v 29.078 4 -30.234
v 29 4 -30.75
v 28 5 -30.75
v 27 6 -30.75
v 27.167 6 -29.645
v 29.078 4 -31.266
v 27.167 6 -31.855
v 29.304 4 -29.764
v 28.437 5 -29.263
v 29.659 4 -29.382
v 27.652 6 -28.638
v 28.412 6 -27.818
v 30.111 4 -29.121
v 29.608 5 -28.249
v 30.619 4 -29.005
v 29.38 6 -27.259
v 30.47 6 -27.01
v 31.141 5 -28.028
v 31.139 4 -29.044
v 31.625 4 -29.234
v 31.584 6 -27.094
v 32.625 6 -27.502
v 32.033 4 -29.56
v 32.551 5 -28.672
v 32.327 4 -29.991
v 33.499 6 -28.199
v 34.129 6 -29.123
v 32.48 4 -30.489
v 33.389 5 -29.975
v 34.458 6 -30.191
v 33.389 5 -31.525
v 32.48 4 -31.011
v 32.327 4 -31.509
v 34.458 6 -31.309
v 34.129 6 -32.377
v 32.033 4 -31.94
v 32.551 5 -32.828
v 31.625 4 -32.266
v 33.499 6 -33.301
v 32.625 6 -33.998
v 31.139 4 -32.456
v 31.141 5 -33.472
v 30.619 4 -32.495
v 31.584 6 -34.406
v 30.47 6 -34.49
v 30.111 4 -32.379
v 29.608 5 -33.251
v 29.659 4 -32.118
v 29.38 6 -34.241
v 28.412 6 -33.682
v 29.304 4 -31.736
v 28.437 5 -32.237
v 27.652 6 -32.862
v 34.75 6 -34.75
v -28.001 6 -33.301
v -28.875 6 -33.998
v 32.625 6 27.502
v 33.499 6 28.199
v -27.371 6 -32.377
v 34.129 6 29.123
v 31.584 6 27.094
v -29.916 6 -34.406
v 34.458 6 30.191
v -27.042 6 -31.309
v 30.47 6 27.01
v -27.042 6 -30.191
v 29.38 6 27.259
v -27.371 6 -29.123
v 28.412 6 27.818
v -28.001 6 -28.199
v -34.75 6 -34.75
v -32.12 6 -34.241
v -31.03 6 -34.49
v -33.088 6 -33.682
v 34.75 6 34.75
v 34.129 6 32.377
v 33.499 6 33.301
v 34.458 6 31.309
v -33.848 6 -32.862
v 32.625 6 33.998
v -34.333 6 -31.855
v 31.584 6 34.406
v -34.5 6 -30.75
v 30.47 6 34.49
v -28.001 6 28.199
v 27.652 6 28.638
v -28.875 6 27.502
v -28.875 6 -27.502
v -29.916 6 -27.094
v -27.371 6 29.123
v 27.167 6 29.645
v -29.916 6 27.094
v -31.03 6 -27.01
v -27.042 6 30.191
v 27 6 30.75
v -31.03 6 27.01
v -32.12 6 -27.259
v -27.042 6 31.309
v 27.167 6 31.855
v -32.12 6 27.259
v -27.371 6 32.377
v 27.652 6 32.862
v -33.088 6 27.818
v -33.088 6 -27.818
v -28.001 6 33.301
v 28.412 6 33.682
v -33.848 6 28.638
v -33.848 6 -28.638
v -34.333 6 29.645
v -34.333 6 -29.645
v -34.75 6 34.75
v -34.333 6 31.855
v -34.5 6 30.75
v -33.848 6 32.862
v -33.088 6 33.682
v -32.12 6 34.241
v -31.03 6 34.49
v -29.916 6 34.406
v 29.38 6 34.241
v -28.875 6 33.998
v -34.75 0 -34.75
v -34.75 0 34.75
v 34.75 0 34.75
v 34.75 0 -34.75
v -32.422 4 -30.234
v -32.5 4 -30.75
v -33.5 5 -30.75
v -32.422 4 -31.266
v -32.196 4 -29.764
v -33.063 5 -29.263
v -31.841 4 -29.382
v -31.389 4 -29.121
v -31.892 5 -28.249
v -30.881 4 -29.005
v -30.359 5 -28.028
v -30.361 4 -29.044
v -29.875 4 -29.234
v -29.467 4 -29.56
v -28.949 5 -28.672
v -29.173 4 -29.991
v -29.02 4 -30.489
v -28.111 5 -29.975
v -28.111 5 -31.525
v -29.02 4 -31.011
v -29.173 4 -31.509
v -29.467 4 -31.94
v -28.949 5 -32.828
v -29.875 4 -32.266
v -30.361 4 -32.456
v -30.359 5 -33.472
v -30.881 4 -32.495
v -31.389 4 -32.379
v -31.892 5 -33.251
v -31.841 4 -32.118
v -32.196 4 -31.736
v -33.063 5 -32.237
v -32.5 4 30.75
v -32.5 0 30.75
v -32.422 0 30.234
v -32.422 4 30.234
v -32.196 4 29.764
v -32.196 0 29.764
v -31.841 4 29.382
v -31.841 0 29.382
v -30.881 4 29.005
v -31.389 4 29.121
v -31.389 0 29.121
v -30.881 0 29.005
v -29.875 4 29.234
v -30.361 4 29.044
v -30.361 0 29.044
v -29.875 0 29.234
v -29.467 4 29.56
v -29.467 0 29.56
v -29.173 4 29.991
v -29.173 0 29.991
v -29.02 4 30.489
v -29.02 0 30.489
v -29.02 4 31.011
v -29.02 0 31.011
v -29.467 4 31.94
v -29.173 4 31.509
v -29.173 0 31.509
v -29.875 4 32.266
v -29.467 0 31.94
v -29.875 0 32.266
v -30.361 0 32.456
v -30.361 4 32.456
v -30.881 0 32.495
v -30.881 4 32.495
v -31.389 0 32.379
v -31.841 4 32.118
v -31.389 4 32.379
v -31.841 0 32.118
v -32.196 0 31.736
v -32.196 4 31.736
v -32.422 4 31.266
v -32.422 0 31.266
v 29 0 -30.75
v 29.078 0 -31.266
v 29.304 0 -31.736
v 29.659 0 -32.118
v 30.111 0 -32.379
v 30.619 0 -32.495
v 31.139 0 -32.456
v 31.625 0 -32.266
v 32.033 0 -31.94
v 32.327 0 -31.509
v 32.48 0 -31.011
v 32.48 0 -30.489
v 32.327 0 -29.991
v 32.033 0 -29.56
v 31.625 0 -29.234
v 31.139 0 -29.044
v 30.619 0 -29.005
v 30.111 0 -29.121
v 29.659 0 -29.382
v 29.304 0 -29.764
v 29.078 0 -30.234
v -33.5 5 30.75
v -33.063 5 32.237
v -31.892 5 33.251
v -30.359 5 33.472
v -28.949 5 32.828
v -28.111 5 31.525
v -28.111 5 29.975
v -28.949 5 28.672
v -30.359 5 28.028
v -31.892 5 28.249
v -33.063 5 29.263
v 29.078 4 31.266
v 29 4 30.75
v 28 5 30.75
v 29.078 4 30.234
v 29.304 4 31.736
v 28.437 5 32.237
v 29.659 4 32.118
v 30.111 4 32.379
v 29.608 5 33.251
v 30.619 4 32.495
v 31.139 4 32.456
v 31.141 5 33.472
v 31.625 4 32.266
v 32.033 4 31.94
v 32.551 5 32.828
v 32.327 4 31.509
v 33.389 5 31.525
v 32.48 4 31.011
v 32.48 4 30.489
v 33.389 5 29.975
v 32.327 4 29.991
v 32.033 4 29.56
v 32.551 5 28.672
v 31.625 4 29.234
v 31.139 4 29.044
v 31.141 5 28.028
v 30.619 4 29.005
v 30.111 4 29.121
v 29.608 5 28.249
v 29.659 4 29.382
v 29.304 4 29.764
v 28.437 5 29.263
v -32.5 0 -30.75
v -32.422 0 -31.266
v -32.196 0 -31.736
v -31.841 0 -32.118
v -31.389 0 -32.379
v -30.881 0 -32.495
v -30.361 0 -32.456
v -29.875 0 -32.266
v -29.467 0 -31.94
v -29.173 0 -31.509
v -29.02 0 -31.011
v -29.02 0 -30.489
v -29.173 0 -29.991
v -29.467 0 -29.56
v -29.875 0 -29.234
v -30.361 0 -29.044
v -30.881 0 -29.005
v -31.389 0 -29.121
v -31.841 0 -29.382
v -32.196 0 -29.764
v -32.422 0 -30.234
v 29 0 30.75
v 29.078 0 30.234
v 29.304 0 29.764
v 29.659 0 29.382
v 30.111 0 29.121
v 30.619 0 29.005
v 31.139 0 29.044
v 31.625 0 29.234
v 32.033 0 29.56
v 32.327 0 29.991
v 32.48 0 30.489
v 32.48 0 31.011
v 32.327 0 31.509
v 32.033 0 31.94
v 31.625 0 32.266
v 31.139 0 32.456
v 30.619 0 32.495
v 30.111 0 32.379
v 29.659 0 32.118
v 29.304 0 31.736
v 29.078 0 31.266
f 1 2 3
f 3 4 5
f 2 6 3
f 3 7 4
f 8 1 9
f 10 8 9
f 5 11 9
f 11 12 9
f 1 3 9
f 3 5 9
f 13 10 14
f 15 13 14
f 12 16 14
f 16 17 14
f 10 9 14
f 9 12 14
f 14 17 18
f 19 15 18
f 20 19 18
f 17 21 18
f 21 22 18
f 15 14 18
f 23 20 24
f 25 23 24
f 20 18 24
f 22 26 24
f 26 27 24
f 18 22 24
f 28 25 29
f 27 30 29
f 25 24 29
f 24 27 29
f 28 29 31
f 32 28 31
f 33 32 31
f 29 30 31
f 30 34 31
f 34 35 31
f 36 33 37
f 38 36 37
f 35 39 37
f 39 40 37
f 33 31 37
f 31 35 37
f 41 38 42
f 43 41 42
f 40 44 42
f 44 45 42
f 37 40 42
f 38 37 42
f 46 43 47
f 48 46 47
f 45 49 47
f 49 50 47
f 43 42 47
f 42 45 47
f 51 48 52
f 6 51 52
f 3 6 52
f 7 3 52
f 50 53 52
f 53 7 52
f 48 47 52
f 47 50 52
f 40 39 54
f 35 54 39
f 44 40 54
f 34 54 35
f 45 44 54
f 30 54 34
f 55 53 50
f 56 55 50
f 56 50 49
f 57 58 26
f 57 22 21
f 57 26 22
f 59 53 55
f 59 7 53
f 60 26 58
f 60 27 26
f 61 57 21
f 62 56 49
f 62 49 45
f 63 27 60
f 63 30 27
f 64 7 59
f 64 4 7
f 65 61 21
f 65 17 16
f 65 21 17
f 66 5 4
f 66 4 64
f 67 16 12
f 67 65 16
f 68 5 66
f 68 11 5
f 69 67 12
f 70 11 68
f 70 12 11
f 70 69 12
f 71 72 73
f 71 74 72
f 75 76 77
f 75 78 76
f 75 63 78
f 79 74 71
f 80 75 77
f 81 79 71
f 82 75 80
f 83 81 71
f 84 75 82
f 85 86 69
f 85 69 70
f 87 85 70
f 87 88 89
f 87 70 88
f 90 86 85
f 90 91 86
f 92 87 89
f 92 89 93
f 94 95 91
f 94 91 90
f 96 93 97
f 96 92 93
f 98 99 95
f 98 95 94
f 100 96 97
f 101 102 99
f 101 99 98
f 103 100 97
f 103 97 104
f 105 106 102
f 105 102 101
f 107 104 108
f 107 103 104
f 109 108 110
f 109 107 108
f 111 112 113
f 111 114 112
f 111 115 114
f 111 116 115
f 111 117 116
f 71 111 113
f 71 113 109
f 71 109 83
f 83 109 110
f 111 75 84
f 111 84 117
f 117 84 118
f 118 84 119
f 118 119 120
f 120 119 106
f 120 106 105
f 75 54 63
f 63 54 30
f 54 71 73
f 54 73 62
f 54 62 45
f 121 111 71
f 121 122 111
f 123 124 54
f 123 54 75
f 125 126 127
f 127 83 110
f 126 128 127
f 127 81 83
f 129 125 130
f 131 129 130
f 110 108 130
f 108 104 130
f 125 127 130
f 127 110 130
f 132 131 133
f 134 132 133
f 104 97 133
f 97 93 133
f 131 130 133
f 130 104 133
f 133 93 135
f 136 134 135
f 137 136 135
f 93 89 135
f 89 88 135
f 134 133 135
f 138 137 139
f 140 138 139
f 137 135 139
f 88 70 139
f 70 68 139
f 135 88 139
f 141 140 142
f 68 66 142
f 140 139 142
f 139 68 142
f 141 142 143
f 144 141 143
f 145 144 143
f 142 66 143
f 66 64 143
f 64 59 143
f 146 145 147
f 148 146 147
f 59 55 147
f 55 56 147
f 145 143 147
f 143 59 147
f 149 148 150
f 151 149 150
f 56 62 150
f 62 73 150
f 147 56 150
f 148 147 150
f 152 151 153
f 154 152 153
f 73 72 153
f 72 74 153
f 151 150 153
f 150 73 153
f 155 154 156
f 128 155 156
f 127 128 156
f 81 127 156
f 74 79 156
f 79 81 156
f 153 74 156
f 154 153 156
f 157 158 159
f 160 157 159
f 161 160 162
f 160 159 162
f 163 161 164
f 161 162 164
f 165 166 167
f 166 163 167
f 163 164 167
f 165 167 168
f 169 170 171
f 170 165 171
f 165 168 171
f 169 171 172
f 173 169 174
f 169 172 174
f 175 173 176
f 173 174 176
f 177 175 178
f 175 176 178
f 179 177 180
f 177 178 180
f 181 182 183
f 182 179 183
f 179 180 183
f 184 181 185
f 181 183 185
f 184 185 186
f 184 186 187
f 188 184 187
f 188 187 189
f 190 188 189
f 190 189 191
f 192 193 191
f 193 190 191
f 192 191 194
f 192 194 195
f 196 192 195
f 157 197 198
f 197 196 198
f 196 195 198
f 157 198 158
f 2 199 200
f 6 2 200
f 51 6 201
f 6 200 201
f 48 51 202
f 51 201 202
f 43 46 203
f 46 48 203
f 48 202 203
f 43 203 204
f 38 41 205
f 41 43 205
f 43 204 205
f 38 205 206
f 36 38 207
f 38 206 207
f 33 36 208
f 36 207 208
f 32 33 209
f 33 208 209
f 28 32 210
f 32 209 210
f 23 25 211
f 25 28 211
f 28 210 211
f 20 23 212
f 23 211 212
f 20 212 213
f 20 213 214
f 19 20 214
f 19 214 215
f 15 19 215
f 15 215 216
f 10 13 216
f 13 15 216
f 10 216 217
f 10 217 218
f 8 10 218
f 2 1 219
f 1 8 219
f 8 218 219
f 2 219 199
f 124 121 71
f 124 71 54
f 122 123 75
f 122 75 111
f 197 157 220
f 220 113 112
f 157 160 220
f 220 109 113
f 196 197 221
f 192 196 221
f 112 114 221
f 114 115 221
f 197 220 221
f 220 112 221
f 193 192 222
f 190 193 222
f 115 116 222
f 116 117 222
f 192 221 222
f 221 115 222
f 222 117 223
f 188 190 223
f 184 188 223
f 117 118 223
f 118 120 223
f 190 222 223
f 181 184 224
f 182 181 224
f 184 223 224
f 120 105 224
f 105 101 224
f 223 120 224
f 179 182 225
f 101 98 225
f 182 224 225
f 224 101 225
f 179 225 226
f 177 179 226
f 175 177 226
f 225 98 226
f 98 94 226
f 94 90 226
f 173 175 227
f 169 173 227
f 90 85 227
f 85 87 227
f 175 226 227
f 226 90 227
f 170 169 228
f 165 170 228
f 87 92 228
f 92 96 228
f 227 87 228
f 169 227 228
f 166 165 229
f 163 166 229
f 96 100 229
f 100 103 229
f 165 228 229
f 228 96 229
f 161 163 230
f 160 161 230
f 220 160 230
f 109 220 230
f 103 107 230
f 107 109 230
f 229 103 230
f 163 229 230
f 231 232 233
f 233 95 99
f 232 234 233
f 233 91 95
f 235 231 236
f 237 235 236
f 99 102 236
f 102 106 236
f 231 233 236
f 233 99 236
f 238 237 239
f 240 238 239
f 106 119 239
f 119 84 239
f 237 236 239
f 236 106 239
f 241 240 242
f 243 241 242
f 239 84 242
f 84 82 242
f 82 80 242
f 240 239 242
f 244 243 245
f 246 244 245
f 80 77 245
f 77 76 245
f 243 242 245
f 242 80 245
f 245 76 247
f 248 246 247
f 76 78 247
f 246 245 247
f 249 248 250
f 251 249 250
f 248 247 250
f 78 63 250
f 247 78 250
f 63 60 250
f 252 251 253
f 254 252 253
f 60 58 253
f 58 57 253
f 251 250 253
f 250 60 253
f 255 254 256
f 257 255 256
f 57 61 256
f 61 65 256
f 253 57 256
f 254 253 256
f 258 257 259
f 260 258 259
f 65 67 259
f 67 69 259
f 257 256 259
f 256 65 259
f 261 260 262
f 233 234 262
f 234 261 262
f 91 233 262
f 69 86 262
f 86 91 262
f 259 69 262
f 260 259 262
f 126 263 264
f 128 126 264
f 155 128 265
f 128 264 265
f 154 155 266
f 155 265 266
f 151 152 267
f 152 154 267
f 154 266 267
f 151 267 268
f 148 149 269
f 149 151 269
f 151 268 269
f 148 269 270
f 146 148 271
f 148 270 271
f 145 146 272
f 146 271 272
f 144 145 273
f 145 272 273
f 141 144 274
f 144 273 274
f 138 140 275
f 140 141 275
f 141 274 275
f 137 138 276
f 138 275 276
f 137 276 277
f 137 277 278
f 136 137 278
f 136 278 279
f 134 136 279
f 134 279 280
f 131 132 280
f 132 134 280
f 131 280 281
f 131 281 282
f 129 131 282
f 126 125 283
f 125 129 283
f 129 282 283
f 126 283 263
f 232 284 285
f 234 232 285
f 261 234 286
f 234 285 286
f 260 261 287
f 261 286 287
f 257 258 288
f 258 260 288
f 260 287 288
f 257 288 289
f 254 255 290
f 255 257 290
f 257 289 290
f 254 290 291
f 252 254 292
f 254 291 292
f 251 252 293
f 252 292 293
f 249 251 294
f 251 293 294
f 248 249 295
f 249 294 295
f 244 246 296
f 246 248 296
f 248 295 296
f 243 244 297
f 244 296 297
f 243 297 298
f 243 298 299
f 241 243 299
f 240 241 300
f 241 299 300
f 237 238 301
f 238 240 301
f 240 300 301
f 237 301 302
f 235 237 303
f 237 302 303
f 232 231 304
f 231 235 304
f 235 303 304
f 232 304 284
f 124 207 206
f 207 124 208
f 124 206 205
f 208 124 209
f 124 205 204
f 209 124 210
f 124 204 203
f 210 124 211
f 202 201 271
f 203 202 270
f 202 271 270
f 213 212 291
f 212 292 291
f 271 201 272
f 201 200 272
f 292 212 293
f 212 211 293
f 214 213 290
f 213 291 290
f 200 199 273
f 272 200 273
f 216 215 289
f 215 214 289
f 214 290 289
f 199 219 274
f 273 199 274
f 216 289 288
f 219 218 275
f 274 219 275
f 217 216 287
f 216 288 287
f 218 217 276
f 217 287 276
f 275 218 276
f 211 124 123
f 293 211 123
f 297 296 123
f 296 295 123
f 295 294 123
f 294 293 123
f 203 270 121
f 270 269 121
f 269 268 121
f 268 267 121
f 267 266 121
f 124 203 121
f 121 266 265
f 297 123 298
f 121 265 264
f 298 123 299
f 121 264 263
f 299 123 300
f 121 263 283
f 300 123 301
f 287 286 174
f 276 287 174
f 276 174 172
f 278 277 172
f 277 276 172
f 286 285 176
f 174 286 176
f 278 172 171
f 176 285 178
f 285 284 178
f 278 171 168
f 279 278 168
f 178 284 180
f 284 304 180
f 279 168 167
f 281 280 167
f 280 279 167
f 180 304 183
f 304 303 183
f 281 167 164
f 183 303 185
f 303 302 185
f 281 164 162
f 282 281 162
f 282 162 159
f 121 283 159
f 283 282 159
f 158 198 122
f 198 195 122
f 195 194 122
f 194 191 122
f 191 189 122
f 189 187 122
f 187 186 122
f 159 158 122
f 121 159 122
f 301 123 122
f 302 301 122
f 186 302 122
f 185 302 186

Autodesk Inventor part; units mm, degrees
ref_plane "YZ Plane" through (0, 0, 0) normal (1, 0, 0) x (0, 1, 0)
ref_plane "XZ Plane" through (0, 0, 0) normal (0, 1, 0) x (-1, 0, 0)
ref_plane "XY Plane" through (0, 0, 0) normal (0, 0, 1) x (1, 0, 0)
sketch "Sketch1" plane through (0, 0, 0) normal (0, 1, 0) x (-1, 0, 0)
  line L0 (34.75, -34.75) -> (-34.75, -34.75)
  line L1 (-34.75, -34.75) -> (-34.75, 34.75)
  line L2 (-34.75, 34.75) -> (34.75, 34.75)
  line L3 (34.75, 34.75) -> (34.75, -34.75)
  line L4 (34.75, -34.75) -> (-34.75, 34.75) construction
  line L5 (-34.75, -34.75) -> (34.75, 34.75) construction
  circle A0 centre (30.75, 30.75) radius 1.75
  circle A1 centre (30.75, -30.75) radius 1.75
  circle A2 centre (-30.75, 30.75) radius 1.75
  circle A3 centre (-30.75, -30.75) radius 1.75
  point P0 (0, 0)
  dimension "d0" = 69.5
  dimension "d1" = 69.5
  dimension "d2" = 3.5
  dimension "d3" = 4
  dimension "d4" = 3.5
  dimension "d5" = 4
  dimension "d6" = 3.5
  dimension "d7" = 3.5
  dimension "d8" = 4
  dimension "d14" = 4
extrude "Extrusion1" add sketch "Sketch1" along normal blind 6
chamfer "Chamfer1" distance 2 angle 45 4 edges at (-29, 6, 30.75) (-29, 6, -30.75) (32.5, 6, 30.75) (32.5, 6, -30.75)
equation "\"d1\" = d0"
equation "\"d4\" = d2"
equation "\"d5\" = d3"
equation "\"d6\" = d2"
equation "\"d7\" = d2"
equation "\"d8\" = d3"
equation "\"d14\" = d3"
properties part number "Modulo"
